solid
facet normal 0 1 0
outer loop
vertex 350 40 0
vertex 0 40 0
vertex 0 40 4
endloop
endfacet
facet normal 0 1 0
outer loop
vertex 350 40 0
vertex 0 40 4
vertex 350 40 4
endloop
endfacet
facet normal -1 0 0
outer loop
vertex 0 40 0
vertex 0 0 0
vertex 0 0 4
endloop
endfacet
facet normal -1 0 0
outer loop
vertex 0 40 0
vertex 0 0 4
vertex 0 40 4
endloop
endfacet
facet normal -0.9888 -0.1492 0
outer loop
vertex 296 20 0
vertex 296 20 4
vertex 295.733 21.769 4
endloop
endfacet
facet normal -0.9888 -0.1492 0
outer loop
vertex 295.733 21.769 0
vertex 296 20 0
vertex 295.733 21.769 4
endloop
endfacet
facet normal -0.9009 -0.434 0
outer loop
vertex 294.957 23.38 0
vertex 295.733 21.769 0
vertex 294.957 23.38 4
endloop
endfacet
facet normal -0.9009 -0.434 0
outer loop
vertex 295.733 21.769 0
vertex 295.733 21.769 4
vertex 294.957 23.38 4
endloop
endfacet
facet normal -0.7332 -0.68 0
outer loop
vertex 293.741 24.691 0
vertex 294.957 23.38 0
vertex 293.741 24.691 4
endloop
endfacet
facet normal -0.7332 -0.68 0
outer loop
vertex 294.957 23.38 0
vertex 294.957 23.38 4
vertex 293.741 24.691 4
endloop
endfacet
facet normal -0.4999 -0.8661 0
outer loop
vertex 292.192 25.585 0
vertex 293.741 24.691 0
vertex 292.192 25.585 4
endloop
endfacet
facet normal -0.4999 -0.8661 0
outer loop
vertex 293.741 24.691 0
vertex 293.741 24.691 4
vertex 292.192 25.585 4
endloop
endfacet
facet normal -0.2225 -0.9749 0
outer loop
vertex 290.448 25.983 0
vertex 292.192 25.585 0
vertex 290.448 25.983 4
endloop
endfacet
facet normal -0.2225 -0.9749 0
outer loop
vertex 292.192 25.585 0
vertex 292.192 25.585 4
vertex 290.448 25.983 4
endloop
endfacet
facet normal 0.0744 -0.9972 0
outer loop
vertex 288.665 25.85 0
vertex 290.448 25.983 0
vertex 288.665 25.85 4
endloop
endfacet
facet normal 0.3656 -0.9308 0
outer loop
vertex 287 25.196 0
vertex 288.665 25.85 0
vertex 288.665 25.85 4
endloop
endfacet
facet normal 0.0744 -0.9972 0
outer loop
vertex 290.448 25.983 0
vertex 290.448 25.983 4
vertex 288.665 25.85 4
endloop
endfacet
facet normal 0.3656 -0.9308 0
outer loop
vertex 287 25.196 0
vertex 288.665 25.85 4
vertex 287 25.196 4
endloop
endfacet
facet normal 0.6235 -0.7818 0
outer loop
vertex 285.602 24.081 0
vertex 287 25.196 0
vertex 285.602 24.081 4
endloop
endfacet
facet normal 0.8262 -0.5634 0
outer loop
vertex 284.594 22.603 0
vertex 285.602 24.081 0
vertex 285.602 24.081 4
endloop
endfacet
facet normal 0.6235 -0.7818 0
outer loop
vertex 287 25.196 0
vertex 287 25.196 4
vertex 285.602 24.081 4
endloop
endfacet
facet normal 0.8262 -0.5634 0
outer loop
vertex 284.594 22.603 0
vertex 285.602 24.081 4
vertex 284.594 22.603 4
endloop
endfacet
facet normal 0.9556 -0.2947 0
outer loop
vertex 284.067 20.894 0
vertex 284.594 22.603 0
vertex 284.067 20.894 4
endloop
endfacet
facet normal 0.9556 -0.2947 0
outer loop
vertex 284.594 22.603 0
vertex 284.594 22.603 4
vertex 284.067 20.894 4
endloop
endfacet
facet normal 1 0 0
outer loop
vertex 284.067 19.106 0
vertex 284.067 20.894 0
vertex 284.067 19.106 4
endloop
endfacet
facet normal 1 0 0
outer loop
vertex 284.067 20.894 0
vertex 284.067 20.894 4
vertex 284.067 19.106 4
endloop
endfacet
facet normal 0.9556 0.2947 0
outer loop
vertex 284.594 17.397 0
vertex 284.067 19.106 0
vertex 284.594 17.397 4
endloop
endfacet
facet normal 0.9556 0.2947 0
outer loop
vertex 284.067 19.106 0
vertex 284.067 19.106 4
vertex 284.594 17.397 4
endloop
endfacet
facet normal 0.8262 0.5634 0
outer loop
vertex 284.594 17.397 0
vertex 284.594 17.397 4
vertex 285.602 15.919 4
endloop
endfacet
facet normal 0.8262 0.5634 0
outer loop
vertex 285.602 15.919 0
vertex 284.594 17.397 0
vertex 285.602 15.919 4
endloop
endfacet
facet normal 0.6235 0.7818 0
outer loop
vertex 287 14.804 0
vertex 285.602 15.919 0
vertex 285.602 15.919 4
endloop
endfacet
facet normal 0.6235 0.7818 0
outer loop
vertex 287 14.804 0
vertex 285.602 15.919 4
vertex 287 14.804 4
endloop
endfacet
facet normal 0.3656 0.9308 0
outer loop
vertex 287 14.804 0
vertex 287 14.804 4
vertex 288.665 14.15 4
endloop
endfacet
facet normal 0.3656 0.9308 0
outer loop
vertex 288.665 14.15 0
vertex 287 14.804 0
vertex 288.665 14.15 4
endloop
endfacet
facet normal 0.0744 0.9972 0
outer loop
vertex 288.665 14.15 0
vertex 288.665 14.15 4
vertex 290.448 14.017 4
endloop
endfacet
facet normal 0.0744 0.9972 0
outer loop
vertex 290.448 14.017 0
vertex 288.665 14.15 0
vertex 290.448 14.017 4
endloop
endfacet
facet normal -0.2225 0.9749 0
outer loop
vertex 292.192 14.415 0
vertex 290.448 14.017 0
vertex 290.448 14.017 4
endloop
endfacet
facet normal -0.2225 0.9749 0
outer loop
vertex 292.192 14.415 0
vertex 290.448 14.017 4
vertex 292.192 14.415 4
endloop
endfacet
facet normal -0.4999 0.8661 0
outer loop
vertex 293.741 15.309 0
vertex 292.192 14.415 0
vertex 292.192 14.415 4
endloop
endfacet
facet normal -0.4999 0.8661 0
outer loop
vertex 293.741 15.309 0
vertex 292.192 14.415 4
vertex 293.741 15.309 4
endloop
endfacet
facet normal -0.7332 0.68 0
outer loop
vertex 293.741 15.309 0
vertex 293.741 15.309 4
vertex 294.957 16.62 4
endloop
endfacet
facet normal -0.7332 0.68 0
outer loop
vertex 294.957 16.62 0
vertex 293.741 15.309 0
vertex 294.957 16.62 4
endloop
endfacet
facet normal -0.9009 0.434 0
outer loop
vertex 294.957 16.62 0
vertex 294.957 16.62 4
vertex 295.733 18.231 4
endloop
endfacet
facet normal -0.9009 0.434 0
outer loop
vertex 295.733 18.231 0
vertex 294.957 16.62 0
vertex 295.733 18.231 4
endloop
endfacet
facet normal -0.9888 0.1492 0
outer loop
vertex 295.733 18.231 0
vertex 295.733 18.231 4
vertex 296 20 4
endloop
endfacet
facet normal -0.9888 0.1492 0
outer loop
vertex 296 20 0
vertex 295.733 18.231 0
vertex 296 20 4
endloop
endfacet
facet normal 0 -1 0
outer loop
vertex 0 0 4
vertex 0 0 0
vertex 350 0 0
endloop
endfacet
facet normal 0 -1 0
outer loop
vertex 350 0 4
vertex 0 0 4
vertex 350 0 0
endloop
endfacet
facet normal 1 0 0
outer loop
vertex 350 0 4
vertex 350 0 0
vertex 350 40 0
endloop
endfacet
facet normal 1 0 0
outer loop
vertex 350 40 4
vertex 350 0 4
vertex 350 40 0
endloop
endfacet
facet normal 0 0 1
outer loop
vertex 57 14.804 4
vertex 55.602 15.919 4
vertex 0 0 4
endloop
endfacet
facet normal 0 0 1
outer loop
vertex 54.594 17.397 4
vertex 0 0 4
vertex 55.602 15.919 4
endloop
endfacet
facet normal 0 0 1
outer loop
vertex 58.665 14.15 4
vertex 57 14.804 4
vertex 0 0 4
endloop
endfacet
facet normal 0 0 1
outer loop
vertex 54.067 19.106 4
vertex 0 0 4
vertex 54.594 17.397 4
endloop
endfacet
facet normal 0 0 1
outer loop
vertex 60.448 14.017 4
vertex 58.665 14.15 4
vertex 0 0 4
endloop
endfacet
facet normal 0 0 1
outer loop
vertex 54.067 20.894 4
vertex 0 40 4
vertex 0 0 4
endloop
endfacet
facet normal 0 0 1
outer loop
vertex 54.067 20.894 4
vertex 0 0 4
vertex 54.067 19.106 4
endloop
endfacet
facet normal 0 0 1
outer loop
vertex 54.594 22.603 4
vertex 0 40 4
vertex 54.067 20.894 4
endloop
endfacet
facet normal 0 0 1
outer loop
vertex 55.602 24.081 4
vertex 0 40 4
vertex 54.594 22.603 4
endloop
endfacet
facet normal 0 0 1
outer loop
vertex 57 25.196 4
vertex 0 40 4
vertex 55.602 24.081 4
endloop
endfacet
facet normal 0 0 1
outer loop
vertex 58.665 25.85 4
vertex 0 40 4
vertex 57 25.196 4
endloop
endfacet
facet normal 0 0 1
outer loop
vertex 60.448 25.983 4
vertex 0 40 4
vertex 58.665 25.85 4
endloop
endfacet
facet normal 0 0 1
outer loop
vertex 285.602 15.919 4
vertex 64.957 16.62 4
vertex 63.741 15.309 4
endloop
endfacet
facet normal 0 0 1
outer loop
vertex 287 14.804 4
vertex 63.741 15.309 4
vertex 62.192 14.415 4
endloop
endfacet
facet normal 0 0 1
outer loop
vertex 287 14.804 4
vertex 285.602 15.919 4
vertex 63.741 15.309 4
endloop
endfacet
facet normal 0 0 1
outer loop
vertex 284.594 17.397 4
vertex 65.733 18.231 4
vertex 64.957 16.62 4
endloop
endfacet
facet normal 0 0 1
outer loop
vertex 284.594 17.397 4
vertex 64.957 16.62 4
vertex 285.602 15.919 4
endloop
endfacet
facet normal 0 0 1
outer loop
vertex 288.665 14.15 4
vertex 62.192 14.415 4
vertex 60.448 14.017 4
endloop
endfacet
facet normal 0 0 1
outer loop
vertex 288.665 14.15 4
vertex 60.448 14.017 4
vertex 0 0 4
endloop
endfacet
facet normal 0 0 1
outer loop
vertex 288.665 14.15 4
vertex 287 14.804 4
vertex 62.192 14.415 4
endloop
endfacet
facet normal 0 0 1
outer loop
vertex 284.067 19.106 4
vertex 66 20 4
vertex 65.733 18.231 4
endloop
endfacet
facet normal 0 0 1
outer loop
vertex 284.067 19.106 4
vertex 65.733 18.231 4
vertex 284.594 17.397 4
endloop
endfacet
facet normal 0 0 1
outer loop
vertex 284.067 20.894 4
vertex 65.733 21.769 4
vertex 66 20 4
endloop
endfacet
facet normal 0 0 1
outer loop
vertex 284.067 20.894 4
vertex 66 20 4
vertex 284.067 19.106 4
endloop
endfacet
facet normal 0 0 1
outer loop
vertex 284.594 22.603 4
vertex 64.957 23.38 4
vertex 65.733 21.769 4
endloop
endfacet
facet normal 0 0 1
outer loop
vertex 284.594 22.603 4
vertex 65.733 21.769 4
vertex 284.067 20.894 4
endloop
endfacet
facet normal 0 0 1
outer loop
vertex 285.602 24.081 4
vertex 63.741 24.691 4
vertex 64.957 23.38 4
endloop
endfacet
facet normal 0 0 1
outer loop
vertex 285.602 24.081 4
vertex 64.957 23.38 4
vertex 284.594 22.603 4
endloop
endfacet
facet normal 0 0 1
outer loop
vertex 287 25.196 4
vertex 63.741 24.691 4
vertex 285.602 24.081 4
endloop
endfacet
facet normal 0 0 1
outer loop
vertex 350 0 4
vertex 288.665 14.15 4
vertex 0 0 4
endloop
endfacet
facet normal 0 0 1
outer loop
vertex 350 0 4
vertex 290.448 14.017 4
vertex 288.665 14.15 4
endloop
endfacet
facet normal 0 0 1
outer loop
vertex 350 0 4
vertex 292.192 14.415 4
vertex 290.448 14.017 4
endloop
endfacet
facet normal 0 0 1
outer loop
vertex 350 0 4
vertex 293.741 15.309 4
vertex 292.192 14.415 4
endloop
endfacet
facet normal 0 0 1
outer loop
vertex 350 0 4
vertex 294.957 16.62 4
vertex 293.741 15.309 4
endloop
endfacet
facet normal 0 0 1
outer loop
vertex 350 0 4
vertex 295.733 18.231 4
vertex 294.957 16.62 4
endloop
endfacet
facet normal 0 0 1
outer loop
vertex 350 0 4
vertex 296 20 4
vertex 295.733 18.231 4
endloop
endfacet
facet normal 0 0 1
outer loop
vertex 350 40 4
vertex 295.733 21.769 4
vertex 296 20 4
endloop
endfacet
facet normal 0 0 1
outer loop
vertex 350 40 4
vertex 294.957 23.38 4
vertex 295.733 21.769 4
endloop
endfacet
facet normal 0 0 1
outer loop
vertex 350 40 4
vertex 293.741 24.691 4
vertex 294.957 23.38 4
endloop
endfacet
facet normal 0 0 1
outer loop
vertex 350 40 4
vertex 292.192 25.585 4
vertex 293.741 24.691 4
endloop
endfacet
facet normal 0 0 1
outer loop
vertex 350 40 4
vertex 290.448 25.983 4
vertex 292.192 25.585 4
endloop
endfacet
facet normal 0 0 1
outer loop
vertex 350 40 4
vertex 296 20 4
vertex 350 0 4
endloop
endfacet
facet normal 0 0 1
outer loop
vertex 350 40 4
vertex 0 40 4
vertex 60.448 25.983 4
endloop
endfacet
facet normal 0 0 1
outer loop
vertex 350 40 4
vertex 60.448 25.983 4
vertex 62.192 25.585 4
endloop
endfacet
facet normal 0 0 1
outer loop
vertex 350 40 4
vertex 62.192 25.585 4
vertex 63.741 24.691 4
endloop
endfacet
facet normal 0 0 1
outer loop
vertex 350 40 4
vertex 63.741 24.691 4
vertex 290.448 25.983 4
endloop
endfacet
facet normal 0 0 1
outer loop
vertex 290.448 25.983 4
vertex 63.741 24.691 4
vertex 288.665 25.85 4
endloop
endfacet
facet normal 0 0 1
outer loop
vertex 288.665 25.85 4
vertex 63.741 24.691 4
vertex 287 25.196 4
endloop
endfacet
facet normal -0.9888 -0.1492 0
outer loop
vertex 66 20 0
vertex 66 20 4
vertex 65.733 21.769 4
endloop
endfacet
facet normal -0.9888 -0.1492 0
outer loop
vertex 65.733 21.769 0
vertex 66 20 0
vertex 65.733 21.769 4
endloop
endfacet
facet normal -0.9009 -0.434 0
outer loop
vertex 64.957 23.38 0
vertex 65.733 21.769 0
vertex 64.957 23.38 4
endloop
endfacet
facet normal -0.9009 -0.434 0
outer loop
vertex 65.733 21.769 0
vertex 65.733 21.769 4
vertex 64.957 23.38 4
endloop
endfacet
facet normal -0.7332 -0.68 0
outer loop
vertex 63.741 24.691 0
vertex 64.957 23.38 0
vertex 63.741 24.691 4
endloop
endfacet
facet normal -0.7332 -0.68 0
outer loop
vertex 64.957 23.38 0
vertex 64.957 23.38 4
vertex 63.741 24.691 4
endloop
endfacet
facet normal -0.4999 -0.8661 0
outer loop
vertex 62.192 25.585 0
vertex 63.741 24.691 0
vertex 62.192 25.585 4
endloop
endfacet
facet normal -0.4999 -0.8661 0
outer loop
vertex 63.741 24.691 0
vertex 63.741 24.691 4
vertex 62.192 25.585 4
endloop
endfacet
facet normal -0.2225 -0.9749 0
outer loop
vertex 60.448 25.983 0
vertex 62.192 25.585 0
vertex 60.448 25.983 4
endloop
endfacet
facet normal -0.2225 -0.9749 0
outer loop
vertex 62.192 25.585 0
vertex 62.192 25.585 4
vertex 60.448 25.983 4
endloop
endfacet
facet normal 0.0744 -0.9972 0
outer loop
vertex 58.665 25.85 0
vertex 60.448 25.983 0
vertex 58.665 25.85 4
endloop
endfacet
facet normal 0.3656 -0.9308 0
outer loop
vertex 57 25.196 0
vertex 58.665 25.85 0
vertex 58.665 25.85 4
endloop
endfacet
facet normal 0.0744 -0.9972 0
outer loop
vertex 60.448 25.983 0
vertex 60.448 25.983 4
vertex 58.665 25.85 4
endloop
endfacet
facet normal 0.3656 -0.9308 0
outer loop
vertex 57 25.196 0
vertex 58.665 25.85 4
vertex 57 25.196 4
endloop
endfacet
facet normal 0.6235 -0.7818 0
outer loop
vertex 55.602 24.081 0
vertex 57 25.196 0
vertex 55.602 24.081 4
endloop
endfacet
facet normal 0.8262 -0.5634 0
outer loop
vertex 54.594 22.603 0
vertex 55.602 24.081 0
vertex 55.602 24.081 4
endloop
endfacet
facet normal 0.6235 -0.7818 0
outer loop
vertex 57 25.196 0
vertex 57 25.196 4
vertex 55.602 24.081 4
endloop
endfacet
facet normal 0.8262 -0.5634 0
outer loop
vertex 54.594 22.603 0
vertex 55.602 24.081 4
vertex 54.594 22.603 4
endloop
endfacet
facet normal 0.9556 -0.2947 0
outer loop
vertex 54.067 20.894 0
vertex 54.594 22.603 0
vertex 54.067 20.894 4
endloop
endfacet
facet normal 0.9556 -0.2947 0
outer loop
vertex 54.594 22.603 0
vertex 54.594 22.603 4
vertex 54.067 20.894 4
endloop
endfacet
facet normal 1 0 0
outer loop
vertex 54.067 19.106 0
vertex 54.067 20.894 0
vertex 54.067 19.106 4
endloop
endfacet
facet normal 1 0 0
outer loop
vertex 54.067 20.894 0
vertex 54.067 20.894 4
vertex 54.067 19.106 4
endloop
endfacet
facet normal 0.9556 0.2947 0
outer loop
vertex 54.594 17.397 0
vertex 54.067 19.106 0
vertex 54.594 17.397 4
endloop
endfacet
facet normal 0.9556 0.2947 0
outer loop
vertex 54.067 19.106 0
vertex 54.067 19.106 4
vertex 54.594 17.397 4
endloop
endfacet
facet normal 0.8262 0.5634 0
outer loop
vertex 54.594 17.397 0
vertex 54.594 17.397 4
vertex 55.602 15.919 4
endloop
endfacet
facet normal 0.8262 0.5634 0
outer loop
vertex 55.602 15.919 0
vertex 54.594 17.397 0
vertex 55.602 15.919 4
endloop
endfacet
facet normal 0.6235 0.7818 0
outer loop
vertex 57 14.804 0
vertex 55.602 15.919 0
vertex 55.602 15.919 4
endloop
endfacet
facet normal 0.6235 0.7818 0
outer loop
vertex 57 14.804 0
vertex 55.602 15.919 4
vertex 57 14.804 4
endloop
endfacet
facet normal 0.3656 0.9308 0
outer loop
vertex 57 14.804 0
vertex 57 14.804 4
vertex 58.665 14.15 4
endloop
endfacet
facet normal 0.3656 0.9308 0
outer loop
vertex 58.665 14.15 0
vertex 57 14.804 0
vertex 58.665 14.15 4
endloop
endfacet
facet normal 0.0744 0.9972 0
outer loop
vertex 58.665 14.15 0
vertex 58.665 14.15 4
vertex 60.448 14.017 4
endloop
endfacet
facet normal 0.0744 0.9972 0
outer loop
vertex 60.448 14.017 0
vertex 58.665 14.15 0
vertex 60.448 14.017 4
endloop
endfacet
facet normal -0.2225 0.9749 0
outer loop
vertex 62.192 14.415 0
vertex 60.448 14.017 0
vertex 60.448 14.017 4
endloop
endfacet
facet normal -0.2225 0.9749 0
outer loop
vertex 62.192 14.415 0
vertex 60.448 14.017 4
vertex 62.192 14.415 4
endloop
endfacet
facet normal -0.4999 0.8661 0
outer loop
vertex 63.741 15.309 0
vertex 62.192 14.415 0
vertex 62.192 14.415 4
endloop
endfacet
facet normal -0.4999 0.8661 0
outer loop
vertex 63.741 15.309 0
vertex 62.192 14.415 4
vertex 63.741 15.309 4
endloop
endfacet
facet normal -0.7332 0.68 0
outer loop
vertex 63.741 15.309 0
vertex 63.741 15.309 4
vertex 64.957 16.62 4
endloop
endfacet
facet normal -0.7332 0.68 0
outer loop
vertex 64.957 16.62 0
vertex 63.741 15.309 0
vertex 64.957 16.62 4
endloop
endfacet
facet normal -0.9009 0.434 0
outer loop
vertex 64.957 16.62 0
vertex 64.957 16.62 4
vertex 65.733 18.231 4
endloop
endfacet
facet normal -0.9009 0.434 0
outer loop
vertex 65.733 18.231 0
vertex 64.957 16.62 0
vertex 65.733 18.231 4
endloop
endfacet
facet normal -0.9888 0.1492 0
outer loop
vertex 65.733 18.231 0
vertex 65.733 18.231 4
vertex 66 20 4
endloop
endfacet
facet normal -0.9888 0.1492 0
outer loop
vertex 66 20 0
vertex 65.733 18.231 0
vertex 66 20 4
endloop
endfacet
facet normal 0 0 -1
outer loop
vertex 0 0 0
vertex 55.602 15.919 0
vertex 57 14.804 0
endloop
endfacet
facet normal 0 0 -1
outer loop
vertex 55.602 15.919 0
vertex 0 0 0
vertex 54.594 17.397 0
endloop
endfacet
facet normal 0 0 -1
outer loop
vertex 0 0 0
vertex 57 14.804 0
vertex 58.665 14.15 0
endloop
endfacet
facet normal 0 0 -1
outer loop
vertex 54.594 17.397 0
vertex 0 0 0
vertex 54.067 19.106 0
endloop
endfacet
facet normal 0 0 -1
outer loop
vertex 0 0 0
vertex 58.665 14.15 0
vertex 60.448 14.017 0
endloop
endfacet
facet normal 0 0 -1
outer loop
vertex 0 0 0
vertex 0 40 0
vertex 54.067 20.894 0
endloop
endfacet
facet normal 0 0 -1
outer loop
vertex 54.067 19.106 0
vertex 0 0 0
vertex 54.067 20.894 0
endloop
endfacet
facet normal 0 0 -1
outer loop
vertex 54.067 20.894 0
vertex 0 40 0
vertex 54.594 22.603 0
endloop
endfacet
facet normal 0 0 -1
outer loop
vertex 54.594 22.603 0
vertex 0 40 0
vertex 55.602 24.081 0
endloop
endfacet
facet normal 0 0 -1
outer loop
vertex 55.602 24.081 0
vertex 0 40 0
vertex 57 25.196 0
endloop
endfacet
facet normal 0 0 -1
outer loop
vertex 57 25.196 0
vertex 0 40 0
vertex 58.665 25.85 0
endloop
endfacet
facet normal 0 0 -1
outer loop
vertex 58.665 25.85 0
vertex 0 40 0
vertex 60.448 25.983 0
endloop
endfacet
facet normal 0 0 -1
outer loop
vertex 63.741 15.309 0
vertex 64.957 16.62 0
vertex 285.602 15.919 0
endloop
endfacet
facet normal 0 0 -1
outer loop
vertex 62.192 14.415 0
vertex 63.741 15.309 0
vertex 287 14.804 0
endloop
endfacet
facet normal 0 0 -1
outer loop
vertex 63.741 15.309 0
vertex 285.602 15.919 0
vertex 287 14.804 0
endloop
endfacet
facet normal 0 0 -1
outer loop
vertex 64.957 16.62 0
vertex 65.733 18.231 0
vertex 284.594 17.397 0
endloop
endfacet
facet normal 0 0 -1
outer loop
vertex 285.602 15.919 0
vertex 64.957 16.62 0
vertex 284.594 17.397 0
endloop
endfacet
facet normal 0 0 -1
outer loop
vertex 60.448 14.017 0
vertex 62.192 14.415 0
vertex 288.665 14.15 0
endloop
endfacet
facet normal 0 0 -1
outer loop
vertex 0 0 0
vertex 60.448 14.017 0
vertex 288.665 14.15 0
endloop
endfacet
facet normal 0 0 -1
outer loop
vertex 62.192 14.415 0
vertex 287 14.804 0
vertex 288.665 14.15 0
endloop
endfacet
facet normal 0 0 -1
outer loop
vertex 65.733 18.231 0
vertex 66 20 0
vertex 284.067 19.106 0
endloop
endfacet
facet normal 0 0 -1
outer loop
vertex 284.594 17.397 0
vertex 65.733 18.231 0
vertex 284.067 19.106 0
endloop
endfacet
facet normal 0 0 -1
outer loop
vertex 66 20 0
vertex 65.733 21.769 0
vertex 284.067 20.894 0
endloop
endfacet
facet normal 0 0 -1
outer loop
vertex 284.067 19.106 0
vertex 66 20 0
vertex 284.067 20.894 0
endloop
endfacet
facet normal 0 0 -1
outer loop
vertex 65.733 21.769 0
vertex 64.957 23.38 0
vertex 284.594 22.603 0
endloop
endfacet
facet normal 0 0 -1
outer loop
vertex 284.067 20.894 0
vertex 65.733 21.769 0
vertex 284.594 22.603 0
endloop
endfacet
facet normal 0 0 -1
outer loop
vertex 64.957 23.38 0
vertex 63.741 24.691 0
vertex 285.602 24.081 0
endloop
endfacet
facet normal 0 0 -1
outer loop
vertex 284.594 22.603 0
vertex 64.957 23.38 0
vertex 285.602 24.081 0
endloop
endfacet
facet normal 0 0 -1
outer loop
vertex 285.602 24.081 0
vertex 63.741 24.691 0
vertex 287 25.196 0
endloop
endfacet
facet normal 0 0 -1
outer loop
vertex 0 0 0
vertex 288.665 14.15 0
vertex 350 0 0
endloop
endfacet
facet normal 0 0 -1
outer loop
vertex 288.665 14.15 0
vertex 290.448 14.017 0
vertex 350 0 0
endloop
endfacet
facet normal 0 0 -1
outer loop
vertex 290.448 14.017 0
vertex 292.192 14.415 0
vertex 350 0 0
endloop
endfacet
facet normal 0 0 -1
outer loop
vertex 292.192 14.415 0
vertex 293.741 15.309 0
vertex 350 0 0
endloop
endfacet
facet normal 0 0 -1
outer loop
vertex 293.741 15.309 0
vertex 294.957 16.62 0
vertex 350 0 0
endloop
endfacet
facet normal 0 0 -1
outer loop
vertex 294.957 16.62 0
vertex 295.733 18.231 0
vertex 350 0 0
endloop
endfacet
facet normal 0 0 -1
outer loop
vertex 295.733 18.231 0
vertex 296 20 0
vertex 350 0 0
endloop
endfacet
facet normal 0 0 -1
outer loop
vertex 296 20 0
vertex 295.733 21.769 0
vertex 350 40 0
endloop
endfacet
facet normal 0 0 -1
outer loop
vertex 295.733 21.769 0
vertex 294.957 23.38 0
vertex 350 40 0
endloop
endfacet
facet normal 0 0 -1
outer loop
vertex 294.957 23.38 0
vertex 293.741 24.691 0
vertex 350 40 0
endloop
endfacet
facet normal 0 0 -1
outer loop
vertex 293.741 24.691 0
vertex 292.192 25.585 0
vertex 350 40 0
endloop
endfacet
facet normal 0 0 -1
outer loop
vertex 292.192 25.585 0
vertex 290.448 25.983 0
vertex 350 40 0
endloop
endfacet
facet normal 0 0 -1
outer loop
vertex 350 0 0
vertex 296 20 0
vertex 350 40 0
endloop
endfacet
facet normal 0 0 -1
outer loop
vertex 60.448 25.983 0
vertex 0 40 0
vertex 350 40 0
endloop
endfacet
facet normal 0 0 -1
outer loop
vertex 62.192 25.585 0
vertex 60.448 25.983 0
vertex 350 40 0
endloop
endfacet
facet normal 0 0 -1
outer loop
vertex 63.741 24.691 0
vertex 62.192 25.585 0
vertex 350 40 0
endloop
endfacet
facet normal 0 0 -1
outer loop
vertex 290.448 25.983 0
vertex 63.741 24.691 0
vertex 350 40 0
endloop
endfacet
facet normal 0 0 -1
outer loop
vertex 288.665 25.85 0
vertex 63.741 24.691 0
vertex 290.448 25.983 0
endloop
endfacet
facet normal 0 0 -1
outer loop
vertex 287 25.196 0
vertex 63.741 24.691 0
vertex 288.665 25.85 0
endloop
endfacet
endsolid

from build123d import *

# Parameters (mm, degrees)
SKETCH_1_W          = 350
SKETCH_1_H          = 40
EXTRUDE_1_DEPTH     = 4
SKETCH_2_R          = 6
CUT_EXTRUDE_1_DEPTH = 353.301007662
SKETCH_3_R          = 6
CUT_EXTRUDE_2_DEPTH = 353.301007662


with BuildPart() as part:
    # Эскиз1 → Бобышка-Вытянуть1 (new body)
    with BuildSketch(Plane.XY):
        with Locations((175, 20)):
            Rectangle(SKETCH_1_W, SKETCH_1_H)
    extrude(amount=EXTRUDE_1_DEPTH)

    # Эскиз2 → Вырез-Вытянуть1 (cut, through all)
    with BuildSketch(Plane.XY.offset(4)):
        with Locations((60, 20)):
            Circle(SKETCH_2_R)
    extrude(amount=-CUT_EXTRUDE_1_DEPTH, mode=Mode.SUBTRACT)

    # Эскиз3 → Вырез-Вытянуть2 (cut, through all)
    with BuildSketch(Plane.XY.offset(4)):
        with Locations((290, 20)):
            Circle(SKETCH_3_R)
    extrude(amount=-CUT_EXTRUDE_2_DEPTH, mode=Mode.SUBTRACT)


solid = part.part
